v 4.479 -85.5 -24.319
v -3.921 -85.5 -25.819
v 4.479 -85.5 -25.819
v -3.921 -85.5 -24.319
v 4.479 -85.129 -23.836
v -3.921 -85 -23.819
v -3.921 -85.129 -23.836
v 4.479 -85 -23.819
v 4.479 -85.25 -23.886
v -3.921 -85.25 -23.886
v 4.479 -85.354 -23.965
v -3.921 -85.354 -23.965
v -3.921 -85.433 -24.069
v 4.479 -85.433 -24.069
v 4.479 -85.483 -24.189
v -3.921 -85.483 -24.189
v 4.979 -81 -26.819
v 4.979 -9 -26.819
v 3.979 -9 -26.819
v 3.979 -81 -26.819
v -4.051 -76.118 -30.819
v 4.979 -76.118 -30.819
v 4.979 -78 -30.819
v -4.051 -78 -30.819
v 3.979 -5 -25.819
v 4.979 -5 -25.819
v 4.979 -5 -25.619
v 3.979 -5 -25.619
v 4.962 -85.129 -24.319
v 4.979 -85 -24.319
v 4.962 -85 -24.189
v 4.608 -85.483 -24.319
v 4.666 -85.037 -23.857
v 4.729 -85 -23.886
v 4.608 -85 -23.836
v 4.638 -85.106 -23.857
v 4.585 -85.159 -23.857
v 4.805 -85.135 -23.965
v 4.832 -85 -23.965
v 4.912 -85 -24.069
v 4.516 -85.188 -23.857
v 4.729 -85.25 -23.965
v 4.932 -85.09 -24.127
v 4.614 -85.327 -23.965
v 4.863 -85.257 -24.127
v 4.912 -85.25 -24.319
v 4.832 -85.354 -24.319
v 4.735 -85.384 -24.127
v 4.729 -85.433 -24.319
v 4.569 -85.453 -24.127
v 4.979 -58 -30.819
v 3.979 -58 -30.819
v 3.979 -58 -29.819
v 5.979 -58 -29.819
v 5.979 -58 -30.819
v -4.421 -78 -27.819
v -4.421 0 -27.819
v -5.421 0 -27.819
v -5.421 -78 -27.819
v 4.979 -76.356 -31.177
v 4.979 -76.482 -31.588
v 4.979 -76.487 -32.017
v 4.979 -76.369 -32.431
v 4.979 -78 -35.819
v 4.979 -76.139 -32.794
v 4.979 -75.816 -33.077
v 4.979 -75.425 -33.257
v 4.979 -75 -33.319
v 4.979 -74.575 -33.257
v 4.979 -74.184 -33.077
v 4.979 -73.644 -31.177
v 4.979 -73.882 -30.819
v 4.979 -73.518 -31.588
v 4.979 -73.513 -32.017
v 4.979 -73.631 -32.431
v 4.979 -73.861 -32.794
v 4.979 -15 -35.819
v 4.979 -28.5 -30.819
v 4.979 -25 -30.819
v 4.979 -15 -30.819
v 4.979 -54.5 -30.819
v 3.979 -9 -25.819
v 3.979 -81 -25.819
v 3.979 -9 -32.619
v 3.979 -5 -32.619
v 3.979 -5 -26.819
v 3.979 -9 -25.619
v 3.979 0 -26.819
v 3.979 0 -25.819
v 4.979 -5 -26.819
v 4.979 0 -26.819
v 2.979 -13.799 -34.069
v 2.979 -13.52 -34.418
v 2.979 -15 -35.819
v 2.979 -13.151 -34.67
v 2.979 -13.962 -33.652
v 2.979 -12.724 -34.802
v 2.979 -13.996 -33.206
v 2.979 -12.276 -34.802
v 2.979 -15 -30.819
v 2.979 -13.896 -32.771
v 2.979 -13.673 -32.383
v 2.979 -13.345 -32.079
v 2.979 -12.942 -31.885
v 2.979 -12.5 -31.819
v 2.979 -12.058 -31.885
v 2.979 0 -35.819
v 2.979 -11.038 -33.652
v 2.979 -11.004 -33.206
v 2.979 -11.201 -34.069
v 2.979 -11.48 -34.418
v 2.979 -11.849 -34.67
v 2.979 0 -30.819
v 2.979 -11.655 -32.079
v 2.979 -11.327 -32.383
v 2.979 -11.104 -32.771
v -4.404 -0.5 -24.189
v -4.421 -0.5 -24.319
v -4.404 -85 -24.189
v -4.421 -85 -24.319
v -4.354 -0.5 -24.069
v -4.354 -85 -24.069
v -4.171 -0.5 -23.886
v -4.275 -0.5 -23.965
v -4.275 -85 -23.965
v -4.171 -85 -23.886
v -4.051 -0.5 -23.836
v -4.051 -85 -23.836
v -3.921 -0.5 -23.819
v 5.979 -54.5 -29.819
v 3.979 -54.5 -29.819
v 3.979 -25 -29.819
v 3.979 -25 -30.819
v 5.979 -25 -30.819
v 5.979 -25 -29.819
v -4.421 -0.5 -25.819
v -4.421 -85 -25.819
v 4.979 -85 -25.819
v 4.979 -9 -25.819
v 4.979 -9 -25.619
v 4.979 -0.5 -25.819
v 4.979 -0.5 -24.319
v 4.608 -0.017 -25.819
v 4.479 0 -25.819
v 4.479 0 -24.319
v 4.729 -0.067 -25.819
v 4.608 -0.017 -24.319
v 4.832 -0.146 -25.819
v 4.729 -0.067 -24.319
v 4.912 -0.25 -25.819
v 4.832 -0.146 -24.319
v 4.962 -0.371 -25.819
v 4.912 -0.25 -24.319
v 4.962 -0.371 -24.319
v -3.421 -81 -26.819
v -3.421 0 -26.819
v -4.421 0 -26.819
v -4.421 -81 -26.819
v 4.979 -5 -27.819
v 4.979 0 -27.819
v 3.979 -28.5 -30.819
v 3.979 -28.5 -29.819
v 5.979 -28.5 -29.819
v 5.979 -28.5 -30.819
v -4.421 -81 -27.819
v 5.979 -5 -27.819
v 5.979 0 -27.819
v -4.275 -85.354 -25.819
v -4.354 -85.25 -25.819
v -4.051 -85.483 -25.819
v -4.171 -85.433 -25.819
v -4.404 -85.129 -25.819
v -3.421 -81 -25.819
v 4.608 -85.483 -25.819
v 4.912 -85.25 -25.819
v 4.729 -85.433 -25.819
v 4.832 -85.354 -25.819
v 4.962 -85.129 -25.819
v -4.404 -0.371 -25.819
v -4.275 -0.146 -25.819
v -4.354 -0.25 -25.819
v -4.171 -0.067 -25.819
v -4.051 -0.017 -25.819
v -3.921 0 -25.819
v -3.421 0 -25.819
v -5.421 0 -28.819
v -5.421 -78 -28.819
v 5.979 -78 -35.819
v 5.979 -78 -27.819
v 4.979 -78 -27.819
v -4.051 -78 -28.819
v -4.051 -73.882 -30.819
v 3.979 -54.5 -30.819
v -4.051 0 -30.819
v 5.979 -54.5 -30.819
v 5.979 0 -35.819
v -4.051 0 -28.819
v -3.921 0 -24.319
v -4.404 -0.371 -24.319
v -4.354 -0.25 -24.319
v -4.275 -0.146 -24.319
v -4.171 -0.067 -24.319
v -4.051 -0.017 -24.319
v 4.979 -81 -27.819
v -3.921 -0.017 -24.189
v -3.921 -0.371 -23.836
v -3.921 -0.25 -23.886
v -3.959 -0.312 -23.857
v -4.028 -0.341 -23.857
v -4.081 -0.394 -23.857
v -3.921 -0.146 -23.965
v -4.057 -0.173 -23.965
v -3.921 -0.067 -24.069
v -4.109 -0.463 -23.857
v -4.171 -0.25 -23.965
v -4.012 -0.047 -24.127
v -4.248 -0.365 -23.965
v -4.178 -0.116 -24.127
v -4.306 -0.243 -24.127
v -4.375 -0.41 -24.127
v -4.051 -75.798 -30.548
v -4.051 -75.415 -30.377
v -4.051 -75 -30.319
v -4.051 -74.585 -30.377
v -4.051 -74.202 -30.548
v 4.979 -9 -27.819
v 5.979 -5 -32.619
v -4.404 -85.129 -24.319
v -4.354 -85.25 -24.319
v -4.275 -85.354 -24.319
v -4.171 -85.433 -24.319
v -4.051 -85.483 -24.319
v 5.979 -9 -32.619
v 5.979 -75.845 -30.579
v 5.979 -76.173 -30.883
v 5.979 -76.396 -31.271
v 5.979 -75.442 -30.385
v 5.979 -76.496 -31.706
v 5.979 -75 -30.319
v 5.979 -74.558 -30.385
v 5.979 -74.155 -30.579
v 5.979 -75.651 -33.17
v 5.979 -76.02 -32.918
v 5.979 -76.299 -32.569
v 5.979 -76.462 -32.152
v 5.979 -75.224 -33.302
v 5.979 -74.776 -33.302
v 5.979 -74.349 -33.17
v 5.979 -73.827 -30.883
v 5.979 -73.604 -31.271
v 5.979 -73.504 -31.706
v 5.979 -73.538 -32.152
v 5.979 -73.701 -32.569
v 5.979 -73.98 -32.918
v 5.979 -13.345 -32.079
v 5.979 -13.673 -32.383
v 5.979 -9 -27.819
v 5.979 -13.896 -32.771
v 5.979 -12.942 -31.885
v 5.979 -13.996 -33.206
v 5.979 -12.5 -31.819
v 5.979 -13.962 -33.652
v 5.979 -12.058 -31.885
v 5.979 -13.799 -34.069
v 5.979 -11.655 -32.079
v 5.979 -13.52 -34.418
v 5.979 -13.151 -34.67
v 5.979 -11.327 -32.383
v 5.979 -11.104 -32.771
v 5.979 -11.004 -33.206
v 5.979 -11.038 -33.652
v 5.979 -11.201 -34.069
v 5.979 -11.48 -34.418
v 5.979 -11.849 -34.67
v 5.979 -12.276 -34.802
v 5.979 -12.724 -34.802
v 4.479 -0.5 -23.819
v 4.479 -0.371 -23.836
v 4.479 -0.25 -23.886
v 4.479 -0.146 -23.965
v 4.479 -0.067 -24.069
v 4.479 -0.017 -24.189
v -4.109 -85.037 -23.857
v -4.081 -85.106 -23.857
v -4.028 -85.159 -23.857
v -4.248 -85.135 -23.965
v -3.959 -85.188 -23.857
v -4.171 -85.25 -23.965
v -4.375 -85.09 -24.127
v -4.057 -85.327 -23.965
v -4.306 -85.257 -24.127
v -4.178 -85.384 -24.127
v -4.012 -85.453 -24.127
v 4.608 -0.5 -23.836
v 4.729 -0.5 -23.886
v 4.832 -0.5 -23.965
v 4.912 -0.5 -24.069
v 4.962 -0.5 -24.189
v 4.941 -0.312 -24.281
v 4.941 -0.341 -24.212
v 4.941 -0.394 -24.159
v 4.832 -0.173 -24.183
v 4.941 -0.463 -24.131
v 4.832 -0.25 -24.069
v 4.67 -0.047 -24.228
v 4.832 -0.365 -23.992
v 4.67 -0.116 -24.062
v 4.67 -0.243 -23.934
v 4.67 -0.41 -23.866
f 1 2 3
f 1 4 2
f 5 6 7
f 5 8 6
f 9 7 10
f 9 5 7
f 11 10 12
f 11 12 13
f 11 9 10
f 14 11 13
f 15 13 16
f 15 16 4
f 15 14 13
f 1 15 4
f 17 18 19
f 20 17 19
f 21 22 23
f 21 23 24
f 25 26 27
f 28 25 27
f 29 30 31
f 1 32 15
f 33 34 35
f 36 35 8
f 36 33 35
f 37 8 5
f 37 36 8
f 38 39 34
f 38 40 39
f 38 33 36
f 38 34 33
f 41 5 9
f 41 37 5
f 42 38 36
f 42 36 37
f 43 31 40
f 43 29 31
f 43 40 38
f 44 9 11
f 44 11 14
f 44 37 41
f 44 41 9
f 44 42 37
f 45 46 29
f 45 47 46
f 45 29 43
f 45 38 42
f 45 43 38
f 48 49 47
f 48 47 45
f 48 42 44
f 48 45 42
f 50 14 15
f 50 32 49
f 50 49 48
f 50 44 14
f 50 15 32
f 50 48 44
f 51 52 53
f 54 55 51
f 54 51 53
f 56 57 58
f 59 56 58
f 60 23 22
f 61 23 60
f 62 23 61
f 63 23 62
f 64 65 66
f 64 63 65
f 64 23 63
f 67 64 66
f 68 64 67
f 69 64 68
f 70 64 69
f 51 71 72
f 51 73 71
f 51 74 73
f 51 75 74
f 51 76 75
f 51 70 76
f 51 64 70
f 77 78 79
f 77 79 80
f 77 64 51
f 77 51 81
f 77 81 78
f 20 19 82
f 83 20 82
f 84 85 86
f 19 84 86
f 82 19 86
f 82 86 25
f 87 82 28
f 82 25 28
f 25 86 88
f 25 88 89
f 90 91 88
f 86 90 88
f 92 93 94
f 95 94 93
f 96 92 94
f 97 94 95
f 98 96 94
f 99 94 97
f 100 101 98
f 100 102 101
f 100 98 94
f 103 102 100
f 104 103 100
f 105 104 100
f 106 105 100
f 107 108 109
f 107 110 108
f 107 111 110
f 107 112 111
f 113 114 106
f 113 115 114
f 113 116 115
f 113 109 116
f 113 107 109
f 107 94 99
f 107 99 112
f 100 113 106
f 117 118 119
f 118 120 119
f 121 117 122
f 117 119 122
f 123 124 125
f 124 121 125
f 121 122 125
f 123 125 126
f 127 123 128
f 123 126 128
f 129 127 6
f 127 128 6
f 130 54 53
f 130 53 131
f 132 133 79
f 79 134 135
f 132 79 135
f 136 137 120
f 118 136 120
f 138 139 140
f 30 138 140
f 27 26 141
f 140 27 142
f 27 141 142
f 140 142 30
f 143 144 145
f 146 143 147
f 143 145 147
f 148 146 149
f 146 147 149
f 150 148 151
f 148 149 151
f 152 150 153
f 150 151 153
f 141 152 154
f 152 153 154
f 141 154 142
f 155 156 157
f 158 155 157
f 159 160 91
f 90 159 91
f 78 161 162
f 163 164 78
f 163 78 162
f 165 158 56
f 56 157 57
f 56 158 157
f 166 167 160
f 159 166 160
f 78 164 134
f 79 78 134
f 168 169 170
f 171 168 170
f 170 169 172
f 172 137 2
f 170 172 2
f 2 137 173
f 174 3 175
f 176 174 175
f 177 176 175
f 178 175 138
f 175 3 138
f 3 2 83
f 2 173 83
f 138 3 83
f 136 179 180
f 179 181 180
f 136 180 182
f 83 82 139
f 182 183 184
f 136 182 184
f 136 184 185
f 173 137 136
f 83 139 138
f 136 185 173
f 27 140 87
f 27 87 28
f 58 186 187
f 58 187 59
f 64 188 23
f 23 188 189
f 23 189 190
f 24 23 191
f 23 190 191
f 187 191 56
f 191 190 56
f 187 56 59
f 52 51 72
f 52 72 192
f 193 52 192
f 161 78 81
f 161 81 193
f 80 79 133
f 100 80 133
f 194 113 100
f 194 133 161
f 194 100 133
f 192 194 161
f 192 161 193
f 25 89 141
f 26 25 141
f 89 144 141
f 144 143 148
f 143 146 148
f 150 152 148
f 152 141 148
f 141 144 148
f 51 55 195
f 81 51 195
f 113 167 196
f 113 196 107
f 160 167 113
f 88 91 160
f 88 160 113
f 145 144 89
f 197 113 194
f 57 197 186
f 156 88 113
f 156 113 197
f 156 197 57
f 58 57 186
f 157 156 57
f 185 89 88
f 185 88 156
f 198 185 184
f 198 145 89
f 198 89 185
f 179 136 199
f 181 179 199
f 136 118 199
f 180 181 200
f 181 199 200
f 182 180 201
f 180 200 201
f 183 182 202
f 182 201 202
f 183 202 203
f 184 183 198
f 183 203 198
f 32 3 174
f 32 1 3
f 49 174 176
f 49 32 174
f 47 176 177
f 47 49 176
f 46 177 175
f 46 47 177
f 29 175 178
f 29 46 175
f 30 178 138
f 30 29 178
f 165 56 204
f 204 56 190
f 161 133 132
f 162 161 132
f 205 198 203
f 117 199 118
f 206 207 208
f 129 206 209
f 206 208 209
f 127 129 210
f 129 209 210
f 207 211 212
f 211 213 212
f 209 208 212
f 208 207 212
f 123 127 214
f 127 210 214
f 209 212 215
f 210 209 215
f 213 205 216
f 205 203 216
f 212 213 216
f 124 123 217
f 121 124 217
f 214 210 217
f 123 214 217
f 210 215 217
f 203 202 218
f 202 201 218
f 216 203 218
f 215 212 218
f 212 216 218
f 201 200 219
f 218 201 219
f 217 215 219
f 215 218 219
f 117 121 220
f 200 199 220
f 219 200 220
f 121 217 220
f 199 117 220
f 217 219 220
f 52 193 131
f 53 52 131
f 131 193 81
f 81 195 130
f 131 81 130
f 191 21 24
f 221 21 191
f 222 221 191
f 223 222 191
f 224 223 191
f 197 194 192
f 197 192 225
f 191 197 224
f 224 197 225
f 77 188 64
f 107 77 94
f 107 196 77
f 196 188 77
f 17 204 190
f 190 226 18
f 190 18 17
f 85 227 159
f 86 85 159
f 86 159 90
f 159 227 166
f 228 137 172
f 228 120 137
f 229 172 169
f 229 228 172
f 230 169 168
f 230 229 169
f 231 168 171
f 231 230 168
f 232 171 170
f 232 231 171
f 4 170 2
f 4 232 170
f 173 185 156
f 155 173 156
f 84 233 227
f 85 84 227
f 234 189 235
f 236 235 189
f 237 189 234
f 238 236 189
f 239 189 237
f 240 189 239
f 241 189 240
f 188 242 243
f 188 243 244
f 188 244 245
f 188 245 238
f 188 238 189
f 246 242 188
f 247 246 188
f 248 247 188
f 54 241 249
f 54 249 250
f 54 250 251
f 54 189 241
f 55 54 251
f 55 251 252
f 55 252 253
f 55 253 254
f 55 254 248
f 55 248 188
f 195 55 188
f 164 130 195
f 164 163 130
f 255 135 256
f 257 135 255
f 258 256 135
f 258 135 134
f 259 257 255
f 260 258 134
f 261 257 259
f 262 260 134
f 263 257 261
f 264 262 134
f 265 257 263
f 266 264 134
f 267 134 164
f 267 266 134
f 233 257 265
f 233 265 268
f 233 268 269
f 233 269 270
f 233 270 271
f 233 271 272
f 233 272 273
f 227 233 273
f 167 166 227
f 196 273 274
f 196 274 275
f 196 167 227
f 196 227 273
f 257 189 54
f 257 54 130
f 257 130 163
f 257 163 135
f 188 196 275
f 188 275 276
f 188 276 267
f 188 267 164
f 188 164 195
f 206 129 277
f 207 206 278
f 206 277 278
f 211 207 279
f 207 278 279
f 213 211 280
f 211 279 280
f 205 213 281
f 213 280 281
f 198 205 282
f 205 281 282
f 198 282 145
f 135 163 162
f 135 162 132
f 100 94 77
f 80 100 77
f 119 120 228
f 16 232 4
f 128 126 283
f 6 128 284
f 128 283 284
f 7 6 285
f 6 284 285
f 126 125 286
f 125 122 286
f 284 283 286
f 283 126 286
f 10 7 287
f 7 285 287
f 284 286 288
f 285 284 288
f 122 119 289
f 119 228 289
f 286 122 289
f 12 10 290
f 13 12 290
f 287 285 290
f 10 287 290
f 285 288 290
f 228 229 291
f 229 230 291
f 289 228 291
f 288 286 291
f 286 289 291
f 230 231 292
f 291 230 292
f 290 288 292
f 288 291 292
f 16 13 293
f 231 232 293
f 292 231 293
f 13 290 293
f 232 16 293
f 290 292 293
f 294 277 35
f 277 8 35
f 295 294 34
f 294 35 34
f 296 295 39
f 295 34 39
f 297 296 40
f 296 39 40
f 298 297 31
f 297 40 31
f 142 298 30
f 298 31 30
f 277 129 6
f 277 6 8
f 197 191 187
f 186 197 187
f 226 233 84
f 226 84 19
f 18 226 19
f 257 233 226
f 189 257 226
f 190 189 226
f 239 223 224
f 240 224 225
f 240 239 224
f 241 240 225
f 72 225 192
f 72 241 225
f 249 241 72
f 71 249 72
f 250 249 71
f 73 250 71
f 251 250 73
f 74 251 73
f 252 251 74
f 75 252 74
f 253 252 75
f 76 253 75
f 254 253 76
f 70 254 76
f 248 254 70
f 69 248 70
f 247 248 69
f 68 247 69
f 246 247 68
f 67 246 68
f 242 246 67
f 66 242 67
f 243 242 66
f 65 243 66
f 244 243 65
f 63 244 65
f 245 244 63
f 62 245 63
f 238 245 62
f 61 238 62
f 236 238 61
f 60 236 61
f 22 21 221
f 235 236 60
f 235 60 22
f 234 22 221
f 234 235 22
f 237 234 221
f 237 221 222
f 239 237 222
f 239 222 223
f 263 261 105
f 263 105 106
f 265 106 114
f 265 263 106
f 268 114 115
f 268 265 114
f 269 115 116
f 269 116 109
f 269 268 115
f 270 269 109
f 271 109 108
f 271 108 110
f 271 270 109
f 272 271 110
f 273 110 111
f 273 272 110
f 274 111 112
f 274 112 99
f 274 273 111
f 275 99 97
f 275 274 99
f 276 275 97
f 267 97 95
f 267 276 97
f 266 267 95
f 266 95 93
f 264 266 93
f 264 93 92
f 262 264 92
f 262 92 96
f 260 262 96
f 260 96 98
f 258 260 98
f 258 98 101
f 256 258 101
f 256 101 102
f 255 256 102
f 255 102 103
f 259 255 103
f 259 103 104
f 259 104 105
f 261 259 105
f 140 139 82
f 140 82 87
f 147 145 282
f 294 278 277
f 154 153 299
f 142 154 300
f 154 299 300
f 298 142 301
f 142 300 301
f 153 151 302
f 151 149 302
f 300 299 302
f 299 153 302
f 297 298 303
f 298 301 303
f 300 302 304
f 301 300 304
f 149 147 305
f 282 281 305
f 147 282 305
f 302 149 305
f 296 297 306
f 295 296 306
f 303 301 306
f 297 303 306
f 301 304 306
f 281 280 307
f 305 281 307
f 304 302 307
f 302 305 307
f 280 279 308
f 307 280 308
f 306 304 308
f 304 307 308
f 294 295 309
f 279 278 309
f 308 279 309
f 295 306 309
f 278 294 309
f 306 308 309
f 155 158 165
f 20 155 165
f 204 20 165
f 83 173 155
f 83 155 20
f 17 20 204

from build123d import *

# Parameters (mm, degrees)
SKETCH1_W           = 9.4
SKETCH1_H           = 2
BOSS_EXTRUDE1_DEPTH = 85.5
BOSS_EXTRUDE2_DEPTH = 81
FILLET1_R           = 0.5
BOSS_EXTRUDE3_DEPTH = 78
SKETCH2_R           = 1.5
CUT_EXTRUDE1_DEPTH  = 87.643786319
CUT_EXTRUDE2_REACH  = 88.644
SKETCH2_3_W         = 4.8
SKETCH2_3_H         = 4
SKETCH2_3_W_2       = 2.2
SKETCH3_W           = 2
SKETCH3_H           = 63
CUT_EXTRUDE3_DEPTH  = 5
SKETCH4_W           = 1
SKETCH4_H           = 3.5
CUT_EXTRUDE4_DEPTH  = 2


with BuildPart() as part:
    # Sketch1 → Boss-Extrude1 (new body)
    with BuildSketch(Plane(origin=(0, 0, 0), x_dir=(1, 0, 0), z_dir=(0, 1, 0))):
        with Locations((0.278560628, 2.818575451)):
            Rectangle(SKETCH1_W, SKETCH1_H)
    extrude(amount=-BOSS_EXTRUDE1_DEPTH)

    # Sketch1<3> → Boss-Extrude2 (add)
    with BuildSketch(Plane(origin=(0, 0, 0), x_dir=(1, 0, 0), z_dir=(0, 1, 0))):
        Polygon((3.978560628, 1.818575451), (-3.421439372, 1.818575451), (-3.421439372, 0.818575451), (-4.421439372, 0.818575451), (-4.421439372, -0.181424549), (4.978560628, -0.181424549), (4.978560628, 0.818575451), (3.978560628, 0.818575451), align=None)
    extrude(amount=-BOSS_EXTRUDE2_DEPTH)

    # Fillet1
    fillet1_edges = [part.edges().sort_by_distance(p)[0] for p in [
        (-4.421439372, -85.5, -2.818575451),
        (4.978560628, -85.5, -2.818575451),
        (-4.421439372, 0, -2.818575451),
        (0.278560628, 0, -3.818575451),
        (4.978560628, 0, -2.818575451),
        (-4.421439372, -42.75, -3.818575451),
        (4.978560628, -42.75, -3.818575451),
        (0.278560628, -85.5, -3.818575451),
    ]]
    fillet(fillet1_edges, radius=FILLET1_R)

    # Sketch1<4> → Boss-Extrude3 (add)
    with BuildSketch(Plane(origin=(0, 0, 0), x_dir=(1, 0, 0), z_dir=(0, 1, 0))):
        Polygon((-5.421439372, -0.181424549), (-4.421439372, -0.181424549), (4.978560628, -0.181424549), (5.978560628, -0.181424549), (5.978560628, -8.181424549), (2.978560628, -8.181424549), (2.978560628, -3.181424549), (-4.050977977, -3.181424549), (-4.050977977, -1.181424549), (-5.421439372, -1.181424549), align=None)
    extrude(amount=-BOSS_EXTRUDE3_DEPTH)

    # Sketch2 → Cut-Extrude1 (cut, through all)
    with BuildSketch(Plane(origin=(5.978560628, 0, 0), x_dir=(0, 0, -1), z_dir=(1, 0, 0))):
        with Locations((-5.681424549, -12.5)):
            Circle(SKETCH2_R)
        with Locations((-4.181424549, -75)):
            Circle(SKETCH2_R)
    extrude(amount=-CUT_EXTRUDE1_DEPTH, mode=Mode.SUBTRACT)

    # Cut-Extrude2: up to this face of the body (flat: up to its plane)
    cut_extrude2_end = Plane(part.part.faces().sort_by_distance((3.978560628, -40.5, -1.318575451))[0])
    # Sketch2<3> → Cut-Extrude2 (cut, up to the picked face)
    with BuildSketch(Plane(origin=(5.978560628, 0, 0), x_dir=(0, 0, -1), z_dir=(1, 0, 0)), mode=Mode.PRIVATE) as cut_extrude2_sk1:
        with Locations((-2.581424549, -7)):
            Rectangle(SKETCH2_3_W, SKETCH2_3_H)
    cut_extrude2_tool1 = split(extrude(cut_extrude2_sk1.sketch, amount=-CUT_EXTRUDE2_REACH, mode=Mode.PRIVATE), bisect_by=cut_extrude2_end, keep=Keep.BOTH, mode=Mode.PRIVATE)
    # Sketch2<3> → Cut-Extrude2 (cut, up to the picked face)
    with BuildSketch(Plane(origin=(5.978560628, 0, 0), x_dir=(0, 0, -1), z_dir=(1, 0, 0)), mode=Mode.PRIVATE) as cut_extrude2_sk2:
        with Locations((0.918575451, -7)):
            Rectangle(SKETCH2_3_W_2, SKETCH2_3_H)
    cut_extrude2_tool2 = split(extrude(cut_extrude2_sk2.sketch, amount=-CUT_EXTRUDE2_REACH, mode=Mode.PRIVATE), bisect_by=cut_extrude2_end, keep=Keep.BOTH, mode=Mode.PRIVATE)
    add(cut_extrude2_tool1.solids().sort_by(Axis((5.978561, -7, 2.581425), (-1, 0, 0)))[0], mode=Mode.SUBTRACT)
    add(cut_extrude2_tool2.solids().sort_by(Axis((5.978561, -7, -0.918575), (-1, 0, 0)))[0], mode=Mode.SUBTRACT)

    # Sketch3 → Cut-Extrude3 (cut)
    with BuildSketch(Plane.XY.offset(8.181424549)):
        with Locations((3.978560628, -46.5)):
            Rectangle(SKETCH3_W, SKETCH3_H)
    extrude(amount=-CUT_EXTRUDE3_DEPTH, mode=Mode.SUBTRACT)

    # Sketch4 → Cut-Extrude4 (cut)
    with BuildSketch(Plane(origin=(5.978560628, 0, 0), x_dir=(0, 0, -1), z_dir=(1, 0, 0))):
        with Locations((-2.681424549, -26.75)):
            Rectangle(SKETCH4_W, SKETCH4_H)
        with Locations((-2.681424549, -56.25)):
            Rectangle(SKETCH4_W, SKETCH4_H)
    extrude(amount=-CUT_EXTRUDE4_DEPTH, mode=Mode.SUBTRACT)


with BuildPart() as body_2:
    # Mirror1: mirrored copy
    add(part.part.mirror(Plane(origin=(0, 0, -13.818575451), x_dir=(1, 0, 0), z_dir=(0, 0, -1))))


solid = body_2.part
